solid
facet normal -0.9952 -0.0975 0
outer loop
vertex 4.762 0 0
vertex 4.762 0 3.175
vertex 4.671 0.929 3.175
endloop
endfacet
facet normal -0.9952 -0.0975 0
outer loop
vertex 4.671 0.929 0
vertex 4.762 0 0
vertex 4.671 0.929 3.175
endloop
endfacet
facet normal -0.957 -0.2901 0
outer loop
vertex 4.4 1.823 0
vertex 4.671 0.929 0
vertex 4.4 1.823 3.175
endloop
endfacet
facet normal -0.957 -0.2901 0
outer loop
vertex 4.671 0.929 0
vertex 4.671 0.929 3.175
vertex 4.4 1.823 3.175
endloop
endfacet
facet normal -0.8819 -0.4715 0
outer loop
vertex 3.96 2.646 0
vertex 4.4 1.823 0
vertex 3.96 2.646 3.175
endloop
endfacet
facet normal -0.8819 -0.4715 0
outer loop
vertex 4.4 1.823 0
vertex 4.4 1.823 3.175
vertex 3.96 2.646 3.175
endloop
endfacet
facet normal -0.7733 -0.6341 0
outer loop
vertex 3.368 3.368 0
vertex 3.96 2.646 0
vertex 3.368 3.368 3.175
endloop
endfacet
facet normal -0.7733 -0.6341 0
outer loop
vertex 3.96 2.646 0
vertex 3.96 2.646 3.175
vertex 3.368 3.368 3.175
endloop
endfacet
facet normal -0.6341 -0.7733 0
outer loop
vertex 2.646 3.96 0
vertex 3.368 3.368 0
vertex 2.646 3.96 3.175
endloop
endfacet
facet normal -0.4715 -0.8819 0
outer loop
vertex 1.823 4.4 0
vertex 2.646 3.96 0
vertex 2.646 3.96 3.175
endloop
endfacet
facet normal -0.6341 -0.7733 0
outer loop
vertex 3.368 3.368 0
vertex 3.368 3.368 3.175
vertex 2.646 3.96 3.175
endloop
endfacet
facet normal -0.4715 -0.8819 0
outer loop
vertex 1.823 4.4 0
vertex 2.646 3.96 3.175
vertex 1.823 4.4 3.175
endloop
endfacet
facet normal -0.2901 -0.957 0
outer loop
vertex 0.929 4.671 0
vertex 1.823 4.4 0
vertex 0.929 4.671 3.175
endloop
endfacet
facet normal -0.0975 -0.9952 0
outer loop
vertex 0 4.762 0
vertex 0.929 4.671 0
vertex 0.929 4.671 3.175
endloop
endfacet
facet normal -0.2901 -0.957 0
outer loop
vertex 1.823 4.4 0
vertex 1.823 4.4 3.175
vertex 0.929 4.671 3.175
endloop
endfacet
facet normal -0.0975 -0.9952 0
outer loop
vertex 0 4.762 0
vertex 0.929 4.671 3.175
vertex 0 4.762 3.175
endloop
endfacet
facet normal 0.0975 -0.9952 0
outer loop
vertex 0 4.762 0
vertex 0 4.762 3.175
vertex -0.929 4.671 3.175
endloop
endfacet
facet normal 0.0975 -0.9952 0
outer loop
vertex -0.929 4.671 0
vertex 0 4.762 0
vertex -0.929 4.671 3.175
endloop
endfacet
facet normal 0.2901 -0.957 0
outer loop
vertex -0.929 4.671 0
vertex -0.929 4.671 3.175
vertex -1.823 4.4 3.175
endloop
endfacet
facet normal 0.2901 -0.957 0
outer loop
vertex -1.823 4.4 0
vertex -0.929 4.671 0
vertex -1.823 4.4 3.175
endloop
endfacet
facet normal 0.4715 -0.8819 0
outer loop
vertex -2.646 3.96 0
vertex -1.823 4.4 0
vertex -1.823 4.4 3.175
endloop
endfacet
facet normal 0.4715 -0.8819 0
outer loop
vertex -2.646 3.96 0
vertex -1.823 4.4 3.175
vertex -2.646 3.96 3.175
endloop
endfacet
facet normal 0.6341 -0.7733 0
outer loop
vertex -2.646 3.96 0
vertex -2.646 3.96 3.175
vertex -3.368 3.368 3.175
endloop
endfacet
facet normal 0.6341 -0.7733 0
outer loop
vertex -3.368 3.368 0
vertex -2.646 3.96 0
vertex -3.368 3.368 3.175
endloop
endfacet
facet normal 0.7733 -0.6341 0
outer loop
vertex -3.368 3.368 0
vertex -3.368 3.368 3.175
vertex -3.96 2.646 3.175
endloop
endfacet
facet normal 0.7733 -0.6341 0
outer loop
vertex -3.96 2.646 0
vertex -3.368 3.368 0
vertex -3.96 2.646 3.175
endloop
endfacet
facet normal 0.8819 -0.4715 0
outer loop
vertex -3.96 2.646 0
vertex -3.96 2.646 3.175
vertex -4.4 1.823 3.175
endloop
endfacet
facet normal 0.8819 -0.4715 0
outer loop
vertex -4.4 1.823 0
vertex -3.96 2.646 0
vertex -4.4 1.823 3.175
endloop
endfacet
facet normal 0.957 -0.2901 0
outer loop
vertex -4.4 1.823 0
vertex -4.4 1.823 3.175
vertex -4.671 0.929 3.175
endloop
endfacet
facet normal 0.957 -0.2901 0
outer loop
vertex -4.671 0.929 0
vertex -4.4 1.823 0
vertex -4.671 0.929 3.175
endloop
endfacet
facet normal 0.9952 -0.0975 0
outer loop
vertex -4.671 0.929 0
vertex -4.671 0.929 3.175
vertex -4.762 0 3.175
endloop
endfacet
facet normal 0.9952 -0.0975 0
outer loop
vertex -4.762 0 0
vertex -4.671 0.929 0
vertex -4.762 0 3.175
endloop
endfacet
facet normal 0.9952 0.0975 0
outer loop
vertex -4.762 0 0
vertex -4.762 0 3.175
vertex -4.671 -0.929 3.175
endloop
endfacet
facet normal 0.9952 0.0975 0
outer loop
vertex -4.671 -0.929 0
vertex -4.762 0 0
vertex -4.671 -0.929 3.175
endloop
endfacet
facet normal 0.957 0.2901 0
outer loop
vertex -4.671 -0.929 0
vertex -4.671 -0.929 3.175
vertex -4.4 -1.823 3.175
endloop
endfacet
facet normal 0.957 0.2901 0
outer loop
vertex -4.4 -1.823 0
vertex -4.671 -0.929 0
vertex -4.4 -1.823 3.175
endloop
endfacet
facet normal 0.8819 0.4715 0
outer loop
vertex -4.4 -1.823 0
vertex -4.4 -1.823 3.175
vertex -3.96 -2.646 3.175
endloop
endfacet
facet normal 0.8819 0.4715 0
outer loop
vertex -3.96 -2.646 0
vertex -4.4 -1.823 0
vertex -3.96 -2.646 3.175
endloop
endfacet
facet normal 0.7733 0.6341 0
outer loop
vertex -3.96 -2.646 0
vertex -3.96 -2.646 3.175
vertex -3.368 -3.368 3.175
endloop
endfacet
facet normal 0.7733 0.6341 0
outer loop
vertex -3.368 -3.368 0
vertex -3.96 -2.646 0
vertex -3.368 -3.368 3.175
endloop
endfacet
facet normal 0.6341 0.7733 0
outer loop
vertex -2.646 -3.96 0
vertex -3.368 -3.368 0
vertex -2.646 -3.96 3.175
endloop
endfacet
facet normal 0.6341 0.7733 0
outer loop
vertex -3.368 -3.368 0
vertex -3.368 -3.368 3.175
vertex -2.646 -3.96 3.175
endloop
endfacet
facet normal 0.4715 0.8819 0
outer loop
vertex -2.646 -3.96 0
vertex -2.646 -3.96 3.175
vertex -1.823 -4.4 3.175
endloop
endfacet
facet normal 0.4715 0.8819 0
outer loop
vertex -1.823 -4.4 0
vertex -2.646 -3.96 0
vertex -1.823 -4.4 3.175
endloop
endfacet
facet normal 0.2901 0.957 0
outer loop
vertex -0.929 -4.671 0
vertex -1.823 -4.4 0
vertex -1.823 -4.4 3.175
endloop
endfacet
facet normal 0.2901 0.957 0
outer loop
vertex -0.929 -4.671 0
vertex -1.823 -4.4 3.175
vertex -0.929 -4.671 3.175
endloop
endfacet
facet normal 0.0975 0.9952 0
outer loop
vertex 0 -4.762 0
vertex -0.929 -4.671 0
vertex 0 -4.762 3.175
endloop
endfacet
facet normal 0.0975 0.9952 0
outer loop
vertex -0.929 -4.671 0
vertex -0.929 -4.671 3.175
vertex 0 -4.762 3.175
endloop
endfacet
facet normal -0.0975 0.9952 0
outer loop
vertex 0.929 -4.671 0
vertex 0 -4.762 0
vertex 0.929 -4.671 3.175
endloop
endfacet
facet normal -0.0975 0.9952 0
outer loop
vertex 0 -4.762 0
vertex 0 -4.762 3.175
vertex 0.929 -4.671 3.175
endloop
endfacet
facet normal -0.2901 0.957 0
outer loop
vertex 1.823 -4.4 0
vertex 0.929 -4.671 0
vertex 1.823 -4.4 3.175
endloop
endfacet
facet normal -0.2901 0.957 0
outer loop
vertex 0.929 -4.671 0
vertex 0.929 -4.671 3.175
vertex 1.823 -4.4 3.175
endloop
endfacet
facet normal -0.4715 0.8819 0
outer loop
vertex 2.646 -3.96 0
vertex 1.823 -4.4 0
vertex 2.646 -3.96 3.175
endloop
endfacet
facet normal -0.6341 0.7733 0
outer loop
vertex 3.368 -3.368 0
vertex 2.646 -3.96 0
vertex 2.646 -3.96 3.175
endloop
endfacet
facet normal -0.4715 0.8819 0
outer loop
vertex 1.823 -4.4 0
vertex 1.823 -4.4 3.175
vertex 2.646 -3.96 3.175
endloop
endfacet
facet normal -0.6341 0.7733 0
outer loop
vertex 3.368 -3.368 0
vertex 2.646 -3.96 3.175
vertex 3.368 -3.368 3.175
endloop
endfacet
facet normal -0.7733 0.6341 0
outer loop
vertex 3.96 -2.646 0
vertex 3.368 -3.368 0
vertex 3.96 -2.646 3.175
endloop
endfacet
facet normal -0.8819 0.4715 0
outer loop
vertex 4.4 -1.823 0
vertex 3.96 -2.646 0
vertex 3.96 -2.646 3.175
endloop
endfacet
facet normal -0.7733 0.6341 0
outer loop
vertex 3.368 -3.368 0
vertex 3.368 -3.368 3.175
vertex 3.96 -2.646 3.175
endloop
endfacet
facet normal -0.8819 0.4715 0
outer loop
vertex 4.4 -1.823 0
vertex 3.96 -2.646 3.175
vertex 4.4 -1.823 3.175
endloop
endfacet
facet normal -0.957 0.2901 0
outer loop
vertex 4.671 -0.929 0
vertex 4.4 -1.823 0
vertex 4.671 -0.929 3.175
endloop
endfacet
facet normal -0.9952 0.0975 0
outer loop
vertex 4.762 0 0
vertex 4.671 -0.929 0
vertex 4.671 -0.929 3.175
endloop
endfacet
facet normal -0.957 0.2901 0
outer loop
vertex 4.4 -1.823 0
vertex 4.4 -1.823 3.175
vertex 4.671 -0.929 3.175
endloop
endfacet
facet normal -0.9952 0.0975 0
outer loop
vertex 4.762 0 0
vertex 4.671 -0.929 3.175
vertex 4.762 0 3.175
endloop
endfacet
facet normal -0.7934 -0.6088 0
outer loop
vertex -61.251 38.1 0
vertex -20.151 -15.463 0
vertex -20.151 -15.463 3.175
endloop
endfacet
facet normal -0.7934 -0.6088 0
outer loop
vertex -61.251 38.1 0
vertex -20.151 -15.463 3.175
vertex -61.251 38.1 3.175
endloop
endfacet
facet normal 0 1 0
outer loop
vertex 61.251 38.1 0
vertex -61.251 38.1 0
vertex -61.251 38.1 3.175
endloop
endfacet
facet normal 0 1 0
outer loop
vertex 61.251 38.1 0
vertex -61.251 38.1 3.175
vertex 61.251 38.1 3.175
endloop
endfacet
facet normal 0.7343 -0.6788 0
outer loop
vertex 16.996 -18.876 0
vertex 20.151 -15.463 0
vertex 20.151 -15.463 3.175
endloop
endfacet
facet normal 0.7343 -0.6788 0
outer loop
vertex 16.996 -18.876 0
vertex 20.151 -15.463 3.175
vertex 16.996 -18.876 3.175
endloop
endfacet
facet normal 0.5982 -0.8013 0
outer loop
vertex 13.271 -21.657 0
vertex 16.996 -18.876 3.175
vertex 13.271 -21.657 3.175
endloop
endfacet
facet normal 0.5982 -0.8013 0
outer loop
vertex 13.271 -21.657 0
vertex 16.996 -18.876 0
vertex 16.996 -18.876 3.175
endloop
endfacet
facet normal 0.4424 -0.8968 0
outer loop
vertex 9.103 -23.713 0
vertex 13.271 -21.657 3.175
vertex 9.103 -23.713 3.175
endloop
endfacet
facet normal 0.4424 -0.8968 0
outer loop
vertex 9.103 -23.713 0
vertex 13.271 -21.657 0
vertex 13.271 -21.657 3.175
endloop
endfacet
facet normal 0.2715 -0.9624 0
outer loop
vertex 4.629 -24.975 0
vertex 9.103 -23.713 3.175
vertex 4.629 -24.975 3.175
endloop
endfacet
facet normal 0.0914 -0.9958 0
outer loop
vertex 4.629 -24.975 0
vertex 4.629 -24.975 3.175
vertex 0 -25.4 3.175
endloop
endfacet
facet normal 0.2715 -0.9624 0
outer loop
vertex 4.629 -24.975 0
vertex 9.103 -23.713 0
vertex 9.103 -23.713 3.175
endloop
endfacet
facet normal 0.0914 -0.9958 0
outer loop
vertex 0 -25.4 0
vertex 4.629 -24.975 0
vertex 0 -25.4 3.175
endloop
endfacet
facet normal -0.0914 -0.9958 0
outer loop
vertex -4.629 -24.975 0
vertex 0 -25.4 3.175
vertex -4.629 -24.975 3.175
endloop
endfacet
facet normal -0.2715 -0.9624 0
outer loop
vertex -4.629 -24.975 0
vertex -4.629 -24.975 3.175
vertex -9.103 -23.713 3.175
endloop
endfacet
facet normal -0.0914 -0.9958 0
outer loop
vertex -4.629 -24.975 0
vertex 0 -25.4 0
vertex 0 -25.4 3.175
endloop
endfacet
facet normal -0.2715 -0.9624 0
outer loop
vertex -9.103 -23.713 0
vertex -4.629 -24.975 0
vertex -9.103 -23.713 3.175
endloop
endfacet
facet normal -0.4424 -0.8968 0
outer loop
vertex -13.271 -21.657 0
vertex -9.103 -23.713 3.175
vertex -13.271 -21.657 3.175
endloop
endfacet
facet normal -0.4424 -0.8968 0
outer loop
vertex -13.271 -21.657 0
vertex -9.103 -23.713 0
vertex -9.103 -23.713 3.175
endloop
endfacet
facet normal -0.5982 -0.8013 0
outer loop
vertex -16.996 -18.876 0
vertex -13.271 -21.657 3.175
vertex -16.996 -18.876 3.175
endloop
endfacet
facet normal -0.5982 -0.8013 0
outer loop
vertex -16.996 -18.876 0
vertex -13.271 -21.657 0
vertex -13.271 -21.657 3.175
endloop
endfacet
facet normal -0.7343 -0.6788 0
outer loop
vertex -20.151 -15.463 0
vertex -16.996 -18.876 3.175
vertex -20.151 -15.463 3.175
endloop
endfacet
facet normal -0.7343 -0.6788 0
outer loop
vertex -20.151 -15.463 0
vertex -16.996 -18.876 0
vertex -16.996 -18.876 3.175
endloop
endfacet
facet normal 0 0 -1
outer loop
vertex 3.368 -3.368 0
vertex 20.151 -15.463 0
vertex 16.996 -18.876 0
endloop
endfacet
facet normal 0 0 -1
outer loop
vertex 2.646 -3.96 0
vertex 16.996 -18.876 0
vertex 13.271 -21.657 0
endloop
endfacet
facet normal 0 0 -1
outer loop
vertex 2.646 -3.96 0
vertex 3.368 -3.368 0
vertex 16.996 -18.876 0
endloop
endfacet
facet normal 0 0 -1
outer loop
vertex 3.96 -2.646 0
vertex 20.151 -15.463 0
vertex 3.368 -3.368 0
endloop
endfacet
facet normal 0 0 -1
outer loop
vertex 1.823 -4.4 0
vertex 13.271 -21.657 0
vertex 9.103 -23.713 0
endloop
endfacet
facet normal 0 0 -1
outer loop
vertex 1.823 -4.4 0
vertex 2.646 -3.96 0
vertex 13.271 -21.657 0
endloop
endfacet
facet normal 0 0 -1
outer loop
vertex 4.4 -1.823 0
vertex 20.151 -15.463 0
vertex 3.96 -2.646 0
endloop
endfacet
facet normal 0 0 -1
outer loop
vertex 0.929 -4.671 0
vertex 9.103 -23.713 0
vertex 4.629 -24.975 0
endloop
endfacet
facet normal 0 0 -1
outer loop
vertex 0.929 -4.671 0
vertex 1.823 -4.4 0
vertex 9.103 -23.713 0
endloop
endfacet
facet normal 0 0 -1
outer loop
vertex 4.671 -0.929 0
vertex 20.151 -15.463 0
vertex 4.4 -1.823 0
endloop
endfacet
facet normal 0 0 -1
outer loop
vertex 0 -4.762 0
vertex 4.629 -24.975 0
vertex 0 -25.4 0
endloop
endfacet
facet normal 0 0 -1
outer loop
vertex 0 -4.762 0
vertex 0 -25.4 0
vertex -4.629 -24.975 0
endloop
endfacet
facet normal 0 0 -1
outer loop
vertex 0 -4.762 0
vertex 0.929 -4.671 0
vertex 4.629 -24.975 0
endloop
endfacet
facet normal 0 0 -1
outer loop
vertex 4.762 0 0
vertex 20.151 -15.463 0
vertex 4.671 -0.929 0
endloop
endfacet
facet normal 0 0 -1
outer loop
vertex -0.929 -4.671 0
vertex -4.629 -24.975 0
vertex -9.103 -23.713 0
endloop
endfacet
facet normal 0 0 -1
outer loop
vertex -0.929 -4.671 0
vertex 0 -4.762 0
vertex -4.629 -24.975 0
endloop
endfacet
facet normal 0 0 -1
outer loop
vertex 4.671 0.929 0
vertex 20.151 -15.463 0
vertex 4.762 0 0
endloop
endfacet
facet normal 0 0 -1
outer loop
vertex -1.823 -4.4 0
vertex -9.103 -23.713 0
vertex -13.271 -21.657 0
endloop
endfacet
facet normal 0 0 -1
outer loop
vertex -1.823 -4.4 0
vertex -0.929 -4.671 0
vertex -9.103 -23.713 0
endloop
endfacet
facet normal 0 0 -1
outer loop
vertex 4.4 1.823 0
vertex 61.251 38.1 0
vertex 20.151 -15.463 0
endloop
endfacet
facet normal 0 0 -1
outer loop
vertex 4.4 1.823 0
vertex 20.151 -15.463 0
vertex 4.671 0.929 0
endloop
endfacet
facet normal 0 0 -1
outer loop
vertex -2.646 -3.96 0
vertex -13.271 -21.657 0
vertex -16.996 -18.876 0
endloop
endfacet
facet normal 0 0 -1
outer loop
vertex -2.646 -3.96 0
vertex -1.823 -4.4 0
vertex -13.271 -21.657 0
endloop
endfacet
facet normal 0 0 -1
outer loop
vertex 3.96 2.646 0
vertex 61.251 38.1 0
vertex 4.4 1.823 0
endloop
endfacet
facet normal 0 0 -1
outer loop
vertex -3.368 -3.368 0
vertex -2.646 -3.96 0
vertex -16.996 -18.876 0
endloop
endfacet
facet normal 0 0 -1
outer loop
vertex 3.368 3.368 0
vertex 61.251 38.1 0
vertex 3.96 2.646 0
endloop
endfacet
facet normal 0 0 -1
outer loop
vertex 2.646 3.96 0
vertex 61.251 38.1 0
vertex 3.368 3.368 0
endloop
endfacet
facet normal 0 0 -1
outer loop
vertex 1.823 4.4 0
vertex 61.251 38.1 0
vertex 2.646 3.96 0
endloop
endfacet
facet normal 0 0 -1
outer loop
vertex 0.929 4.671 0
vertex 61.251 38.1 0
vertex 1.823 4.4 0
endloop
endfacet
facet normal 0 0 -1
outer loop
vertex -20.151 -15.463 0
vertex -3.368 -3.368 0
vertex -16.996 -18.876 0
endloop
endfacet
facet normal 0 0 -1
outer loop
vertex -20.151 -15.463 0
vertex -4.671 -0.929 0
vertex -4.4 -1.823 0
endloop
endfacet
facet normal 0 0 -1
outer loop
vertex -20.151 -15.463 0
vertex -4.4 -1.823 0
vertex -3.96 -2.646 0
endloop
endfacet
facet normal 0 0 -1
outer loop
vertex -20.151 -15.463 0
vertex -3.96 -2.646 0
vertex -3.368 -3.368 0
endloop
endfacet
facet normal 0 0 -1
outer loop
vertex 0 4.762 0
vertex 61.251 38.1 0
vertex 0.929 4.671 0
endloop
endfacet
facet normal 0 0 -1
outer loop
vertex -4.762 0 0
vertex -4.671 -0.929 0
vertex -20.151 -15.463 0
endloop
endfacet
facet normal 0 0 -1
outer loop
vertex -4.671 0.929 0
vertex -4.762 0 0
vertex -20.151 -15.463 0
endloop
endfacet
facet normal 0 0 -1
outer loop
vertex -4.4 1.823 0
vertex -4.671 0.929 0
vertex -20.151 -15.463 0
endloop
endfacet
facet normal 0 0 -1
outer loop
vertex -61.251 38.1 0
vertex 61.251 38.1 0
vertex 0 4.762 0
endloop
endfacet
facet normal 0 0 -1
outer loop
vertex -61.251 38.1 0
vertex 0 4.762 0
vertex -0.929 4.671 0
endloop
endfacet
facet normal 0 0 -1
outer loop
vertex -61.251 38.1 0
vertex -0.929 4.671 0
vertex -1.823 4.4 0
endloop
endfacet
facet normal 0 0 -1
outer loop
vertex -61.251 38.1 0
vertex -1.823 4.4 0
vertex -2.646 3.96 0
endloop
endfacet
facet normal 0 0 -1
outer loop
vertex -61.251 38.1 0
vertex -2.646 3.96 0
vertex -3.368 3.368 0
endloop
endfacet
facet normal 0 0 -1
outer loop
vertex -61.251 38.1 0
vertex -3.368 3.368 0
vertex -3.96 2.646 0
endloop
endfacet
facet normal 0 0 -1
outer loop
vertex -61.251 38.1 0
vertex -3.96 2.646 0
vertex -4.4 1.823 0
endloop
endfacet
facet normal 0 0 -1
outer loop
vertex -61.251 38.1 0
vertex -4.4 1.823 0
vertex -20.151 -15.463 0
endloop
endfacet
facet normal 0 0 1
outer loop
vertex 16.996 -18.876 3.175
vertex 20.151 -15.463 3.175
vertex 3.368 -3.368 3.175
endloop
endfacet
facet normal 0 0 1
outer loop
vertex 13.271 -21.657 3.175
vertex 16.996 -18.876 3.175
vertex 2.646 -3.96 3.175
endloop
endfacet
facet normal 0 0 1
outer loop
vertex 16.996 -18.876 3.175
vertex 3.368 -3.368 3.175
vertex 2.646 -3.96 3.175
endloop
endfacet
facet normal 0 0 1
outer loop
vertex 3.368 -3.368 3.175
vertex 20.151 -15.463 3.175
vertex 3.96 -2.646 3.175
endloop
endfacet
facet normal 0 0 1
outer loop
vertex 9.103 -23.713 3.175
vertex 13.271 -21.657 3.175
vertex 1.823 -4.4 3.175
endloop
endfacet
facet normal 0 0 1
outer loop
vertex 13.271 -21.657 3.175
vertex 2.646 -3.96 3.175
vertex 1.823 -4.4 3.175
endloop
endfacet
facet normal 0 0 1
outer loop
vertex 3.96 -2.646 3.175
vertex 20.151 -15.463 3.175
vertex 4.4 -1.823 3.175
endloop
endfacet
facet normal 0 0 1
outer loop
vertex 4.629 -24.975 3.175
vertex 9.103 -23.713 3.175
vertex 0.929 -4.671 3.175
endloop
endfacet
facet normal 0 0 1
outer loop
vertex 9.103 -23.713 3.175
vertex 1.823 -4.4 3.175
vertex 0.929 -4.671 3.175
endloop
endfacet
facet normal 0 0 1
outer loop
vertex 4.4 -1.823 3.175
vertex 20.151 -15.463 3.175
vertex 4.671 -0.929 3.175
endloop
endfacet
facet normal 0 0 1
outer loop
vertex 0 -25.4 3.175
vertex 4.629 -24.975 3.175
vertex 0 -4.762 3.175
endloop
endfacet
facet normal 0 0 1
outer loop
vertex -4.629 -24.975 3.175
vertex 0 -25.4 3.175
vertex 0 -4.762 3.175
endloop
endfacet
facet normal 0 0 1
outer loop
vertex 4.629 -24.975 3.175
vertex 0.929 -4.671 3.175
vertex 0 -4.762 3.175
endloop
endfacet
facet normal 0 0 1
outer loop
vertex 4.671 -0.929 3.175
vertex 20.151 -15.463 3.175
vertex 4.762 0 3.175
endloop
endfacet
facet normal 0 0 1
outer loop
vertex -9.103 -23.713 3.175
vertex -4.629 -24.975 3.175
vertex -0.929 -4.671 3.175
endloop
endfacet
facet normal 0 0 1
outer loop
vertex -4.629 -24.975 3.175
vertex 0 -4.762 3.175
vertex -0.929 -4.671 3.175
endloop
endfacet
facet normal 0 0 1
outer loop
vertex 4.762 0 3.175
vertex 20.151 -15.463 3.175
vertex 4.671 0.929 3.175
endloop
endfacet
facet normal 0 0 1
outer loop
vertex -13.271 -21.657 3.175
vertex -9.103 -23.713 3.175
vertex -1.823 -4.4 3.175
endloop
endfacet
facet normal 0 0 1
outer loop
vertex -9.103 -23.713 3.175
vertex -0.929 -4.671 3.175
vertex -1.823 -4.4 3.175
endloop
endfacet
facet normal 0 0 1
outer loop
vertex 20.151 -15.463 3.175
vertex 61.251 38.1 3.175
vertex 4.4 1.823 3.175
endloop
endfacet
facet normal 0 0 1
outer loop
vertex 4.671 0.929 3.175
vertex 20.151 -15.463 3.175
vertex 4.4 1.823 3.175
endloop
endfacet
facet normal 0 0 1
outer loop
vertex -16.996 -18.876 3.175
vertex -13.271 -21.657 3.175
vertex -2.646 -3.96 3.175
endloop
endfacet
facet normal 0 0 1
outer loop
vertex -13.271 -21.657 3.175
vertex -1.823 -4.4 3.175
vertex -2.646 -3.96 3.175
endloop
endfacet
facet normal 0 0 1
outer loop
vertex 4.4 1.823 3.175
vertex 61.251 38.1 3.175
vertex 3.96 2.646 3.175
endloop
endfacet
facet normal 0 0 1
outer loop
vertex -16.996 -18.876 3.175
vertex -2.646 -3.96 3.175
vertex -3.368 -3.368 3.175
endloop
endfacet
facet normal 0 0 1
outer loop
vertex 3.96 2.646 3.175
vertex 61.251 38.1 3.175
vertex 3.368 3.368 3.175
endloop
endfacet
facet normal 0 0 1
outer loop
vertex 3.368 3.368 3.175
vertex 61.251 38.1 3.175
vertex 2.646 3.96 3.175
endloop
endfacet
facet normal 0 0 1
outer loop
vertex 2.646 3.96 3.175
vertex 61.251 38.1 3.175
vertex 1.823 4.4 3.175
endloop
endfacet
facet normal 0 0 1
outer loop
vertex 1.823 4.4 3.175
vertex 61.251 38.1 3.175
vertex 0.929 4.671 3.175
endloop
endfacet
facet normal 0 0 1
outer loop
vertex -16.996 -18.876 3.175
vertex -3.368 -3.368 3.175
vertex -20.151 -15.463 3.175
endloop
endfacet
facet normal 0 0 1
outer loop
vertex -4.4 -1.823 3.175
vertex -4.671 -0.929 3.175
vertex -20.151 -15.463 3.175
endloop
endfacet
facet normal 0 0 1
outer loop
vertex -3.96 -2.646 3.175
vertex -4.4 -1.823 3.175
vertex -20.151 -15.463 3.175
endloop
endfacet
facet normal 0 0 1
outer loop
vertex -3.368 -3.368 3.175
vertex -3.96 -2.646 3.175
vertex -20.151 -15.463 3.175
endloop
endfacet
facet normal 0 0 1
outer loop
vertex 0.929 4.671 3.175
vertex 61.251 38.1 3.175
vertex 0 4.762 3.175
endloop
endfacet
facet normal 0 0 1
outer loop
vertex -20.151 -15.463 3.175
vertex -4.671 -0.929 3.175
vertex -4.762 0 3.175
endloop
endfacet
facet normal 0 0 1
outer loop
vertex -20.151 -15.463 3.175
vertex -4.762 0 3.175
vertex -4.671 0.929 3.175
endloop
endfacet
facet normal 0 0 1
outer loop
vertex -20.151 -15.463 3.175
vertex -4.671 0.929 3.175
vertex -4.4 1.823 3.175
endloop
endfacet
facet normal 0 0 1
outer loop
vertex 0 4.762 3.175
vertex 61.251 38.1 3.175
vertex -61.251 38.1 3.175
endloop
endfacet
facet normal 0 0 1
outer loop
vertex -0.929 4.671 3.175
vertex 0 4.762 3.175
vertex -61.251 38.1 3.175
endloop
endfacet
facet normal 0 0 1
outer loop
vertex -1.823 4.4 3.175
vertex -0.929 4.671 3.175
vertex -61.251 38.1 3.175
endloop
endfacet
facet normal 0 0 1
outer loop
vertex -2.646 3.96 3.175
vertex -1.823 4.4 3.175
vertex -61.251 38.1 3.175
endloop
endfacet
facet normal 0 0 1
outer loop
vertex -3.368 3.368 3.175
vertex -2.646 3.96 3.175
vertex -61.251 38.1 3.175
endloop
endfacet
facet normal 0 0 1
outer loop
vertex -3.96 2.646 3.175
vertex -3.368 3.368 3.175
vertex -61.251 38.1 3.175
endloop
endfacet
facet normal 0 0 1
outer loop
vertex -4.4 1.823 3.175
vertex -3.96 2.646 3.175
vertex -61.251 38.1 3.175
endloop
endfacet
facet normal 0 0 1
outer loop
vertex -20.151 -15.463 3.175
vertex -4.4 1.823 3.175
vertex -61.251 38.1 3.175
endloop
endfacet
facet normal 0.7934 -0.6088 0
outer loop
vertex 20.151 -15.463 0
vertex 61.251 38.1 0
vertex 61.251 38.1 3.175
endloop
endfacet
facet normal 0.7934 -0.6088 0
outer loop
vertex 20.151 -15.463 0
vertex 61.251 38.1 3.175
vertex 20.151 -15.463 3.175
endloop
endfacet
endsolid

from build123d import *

# Parameters (mm, degrees)
BOSS_EXTRUDE1_DEPTH = 3.175
SKETCH2_R           = 4.7625
CUT_EXTRUDE1_DEPTH  = 73.203842884


with BuildPart() as part:
    # Sketch1 → Boss-Extrude1 (new body)
    with BuildSketch(Plane.XY):
        with BuildLine():
            Line((-20.151174843, -15.462540297), (-61.251157558, 38.1))
            Line((-61.251157558, 38.1), (61.251157558, 38.1))
            Line((61.251157558, 38.1), (20.151174843, -15.462540297))
            ThreePointArc((20.151174843, -15.462540297), (0, -25.4), (-20.151174843, -15.462540297))
        make_face()
    extrude(amount=BOSS_EXTRUDE1_DEPTH)

    # Sketch2 → Cut-Extrude1 (cut, through all)
    with BuildSketch(Plane.XY.offset(3.175)):
        Circle(SKETCH2_R)
    extrude(amount=-CUT_EXTRUDE1_DEPTH, mode=Mode.SUBTRACT)


solid = part.part
